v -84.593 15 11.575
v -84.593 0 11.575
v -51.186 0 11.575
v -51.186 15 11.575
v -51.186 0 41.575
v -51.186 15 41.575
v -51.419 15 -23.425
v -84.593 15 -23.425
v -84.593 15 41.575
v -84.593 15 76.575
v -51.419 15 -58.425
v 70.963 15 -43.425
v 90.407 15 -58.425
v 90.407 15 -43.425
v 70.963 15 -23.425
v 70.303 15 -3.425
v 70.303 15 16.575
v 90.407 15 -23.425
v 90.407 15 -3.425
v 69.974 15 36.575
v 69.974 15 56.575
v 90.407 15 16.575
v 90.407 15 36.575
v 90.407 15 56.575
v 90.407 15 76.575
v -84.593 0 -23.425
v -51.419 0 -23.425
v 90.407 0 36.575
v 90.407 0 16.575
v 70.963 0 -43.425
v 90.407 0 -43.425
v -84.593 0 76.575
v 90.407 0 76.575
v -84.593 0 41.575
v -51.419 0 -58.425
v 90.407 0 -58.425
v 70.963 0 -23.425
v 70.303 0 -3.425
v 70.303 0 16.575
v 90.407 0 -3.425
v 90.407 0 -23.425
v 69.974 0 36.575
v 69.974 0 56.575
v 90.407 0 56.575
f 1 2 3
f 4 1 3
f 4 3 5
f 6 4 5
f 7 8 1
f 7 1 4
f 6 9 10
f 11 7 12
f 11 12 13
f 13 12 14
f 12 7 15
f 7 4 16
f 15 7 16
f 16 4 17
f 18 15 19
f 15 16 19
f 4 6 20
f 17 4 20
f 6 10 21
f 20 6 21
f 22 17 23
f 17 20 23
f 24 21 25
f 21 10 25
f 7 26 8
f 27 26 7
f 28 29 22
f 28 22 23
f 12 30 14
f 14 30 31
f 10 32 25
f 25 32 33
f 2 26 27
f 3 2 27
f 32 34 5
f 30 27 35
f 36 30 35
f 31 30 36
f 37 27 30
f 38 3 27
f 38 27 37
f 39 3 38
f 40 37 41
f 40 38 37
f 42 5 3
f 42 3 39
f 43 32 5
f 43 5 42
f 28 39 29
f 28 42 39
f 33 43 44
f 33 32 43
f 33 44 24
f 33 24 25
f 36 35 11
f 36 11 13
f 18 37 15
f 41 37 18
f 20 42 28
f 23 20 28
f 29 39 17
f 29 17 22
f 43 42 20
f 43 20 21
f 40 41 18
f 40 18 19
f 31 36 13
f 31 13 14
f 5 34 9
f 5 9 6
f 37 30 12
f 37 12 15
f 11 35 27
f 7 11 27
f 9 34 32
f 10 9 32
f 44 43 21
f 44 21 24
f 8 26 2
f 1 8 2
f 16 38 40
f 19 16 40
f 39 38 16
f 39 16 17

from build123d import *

# Parameters (mm, degrees)
F0_W     = 175
F0_H     = 135
F1_DEPTH = 15
F2_W     = 33.1738661975
F2_H     = 35
F2_W_2   = 33.4070246667
F2_H_2   = 30
F3_DEPTH = 15.001
F4_W     = 20.4337459058
F4_H     = 20
F4_W_2   = 20.1040055603
F4_W_3   = 19.4445397705
F5_DEPTH = 15.001


with BuildPart() as f1:
    # F0 (on Front) → F1 (new body)
    with BuildSketch(Plane.XZ):
        with Locations((2.9073413461, 9.0749097914)):
            Rectangle(F0_W, F0_H)
    extrude(amount=-F1_DEPTH)

    # F2 (on face) → F3 (cut, through all)
    with BuildSketch(Plane.XZ):
        with Locations((-68.0057255551, -40.9250902086)):
            Rectangle(F2_W, F2_H)
        with Locations((-67.8891463205, 26.5749097914)):
            Rectangle(F2_W_2, F2_H_2)
    extrude(amount=-F3_DEPTH, mode=Mode.SUBTRACT)

    # F4 (on face) → F5 (cut, through all)
    with BuildSketch(Plane.XZ):
        with Locations((80.1904683933, 46.5749097914)):
            Rectangle(F4_W, F4_H)
        with Locations((80.355338566, 6.5749097914)):
            Rectangle(F4_W_2, F4_H)
        with Locations((80.6850714609, -33.4250902086)):
            Rectangle(F4_W_3, F4_H)
    extrude(amount=-F5_DEPTH, mode=Mode.SUBTRACT)


solid = f1.part
